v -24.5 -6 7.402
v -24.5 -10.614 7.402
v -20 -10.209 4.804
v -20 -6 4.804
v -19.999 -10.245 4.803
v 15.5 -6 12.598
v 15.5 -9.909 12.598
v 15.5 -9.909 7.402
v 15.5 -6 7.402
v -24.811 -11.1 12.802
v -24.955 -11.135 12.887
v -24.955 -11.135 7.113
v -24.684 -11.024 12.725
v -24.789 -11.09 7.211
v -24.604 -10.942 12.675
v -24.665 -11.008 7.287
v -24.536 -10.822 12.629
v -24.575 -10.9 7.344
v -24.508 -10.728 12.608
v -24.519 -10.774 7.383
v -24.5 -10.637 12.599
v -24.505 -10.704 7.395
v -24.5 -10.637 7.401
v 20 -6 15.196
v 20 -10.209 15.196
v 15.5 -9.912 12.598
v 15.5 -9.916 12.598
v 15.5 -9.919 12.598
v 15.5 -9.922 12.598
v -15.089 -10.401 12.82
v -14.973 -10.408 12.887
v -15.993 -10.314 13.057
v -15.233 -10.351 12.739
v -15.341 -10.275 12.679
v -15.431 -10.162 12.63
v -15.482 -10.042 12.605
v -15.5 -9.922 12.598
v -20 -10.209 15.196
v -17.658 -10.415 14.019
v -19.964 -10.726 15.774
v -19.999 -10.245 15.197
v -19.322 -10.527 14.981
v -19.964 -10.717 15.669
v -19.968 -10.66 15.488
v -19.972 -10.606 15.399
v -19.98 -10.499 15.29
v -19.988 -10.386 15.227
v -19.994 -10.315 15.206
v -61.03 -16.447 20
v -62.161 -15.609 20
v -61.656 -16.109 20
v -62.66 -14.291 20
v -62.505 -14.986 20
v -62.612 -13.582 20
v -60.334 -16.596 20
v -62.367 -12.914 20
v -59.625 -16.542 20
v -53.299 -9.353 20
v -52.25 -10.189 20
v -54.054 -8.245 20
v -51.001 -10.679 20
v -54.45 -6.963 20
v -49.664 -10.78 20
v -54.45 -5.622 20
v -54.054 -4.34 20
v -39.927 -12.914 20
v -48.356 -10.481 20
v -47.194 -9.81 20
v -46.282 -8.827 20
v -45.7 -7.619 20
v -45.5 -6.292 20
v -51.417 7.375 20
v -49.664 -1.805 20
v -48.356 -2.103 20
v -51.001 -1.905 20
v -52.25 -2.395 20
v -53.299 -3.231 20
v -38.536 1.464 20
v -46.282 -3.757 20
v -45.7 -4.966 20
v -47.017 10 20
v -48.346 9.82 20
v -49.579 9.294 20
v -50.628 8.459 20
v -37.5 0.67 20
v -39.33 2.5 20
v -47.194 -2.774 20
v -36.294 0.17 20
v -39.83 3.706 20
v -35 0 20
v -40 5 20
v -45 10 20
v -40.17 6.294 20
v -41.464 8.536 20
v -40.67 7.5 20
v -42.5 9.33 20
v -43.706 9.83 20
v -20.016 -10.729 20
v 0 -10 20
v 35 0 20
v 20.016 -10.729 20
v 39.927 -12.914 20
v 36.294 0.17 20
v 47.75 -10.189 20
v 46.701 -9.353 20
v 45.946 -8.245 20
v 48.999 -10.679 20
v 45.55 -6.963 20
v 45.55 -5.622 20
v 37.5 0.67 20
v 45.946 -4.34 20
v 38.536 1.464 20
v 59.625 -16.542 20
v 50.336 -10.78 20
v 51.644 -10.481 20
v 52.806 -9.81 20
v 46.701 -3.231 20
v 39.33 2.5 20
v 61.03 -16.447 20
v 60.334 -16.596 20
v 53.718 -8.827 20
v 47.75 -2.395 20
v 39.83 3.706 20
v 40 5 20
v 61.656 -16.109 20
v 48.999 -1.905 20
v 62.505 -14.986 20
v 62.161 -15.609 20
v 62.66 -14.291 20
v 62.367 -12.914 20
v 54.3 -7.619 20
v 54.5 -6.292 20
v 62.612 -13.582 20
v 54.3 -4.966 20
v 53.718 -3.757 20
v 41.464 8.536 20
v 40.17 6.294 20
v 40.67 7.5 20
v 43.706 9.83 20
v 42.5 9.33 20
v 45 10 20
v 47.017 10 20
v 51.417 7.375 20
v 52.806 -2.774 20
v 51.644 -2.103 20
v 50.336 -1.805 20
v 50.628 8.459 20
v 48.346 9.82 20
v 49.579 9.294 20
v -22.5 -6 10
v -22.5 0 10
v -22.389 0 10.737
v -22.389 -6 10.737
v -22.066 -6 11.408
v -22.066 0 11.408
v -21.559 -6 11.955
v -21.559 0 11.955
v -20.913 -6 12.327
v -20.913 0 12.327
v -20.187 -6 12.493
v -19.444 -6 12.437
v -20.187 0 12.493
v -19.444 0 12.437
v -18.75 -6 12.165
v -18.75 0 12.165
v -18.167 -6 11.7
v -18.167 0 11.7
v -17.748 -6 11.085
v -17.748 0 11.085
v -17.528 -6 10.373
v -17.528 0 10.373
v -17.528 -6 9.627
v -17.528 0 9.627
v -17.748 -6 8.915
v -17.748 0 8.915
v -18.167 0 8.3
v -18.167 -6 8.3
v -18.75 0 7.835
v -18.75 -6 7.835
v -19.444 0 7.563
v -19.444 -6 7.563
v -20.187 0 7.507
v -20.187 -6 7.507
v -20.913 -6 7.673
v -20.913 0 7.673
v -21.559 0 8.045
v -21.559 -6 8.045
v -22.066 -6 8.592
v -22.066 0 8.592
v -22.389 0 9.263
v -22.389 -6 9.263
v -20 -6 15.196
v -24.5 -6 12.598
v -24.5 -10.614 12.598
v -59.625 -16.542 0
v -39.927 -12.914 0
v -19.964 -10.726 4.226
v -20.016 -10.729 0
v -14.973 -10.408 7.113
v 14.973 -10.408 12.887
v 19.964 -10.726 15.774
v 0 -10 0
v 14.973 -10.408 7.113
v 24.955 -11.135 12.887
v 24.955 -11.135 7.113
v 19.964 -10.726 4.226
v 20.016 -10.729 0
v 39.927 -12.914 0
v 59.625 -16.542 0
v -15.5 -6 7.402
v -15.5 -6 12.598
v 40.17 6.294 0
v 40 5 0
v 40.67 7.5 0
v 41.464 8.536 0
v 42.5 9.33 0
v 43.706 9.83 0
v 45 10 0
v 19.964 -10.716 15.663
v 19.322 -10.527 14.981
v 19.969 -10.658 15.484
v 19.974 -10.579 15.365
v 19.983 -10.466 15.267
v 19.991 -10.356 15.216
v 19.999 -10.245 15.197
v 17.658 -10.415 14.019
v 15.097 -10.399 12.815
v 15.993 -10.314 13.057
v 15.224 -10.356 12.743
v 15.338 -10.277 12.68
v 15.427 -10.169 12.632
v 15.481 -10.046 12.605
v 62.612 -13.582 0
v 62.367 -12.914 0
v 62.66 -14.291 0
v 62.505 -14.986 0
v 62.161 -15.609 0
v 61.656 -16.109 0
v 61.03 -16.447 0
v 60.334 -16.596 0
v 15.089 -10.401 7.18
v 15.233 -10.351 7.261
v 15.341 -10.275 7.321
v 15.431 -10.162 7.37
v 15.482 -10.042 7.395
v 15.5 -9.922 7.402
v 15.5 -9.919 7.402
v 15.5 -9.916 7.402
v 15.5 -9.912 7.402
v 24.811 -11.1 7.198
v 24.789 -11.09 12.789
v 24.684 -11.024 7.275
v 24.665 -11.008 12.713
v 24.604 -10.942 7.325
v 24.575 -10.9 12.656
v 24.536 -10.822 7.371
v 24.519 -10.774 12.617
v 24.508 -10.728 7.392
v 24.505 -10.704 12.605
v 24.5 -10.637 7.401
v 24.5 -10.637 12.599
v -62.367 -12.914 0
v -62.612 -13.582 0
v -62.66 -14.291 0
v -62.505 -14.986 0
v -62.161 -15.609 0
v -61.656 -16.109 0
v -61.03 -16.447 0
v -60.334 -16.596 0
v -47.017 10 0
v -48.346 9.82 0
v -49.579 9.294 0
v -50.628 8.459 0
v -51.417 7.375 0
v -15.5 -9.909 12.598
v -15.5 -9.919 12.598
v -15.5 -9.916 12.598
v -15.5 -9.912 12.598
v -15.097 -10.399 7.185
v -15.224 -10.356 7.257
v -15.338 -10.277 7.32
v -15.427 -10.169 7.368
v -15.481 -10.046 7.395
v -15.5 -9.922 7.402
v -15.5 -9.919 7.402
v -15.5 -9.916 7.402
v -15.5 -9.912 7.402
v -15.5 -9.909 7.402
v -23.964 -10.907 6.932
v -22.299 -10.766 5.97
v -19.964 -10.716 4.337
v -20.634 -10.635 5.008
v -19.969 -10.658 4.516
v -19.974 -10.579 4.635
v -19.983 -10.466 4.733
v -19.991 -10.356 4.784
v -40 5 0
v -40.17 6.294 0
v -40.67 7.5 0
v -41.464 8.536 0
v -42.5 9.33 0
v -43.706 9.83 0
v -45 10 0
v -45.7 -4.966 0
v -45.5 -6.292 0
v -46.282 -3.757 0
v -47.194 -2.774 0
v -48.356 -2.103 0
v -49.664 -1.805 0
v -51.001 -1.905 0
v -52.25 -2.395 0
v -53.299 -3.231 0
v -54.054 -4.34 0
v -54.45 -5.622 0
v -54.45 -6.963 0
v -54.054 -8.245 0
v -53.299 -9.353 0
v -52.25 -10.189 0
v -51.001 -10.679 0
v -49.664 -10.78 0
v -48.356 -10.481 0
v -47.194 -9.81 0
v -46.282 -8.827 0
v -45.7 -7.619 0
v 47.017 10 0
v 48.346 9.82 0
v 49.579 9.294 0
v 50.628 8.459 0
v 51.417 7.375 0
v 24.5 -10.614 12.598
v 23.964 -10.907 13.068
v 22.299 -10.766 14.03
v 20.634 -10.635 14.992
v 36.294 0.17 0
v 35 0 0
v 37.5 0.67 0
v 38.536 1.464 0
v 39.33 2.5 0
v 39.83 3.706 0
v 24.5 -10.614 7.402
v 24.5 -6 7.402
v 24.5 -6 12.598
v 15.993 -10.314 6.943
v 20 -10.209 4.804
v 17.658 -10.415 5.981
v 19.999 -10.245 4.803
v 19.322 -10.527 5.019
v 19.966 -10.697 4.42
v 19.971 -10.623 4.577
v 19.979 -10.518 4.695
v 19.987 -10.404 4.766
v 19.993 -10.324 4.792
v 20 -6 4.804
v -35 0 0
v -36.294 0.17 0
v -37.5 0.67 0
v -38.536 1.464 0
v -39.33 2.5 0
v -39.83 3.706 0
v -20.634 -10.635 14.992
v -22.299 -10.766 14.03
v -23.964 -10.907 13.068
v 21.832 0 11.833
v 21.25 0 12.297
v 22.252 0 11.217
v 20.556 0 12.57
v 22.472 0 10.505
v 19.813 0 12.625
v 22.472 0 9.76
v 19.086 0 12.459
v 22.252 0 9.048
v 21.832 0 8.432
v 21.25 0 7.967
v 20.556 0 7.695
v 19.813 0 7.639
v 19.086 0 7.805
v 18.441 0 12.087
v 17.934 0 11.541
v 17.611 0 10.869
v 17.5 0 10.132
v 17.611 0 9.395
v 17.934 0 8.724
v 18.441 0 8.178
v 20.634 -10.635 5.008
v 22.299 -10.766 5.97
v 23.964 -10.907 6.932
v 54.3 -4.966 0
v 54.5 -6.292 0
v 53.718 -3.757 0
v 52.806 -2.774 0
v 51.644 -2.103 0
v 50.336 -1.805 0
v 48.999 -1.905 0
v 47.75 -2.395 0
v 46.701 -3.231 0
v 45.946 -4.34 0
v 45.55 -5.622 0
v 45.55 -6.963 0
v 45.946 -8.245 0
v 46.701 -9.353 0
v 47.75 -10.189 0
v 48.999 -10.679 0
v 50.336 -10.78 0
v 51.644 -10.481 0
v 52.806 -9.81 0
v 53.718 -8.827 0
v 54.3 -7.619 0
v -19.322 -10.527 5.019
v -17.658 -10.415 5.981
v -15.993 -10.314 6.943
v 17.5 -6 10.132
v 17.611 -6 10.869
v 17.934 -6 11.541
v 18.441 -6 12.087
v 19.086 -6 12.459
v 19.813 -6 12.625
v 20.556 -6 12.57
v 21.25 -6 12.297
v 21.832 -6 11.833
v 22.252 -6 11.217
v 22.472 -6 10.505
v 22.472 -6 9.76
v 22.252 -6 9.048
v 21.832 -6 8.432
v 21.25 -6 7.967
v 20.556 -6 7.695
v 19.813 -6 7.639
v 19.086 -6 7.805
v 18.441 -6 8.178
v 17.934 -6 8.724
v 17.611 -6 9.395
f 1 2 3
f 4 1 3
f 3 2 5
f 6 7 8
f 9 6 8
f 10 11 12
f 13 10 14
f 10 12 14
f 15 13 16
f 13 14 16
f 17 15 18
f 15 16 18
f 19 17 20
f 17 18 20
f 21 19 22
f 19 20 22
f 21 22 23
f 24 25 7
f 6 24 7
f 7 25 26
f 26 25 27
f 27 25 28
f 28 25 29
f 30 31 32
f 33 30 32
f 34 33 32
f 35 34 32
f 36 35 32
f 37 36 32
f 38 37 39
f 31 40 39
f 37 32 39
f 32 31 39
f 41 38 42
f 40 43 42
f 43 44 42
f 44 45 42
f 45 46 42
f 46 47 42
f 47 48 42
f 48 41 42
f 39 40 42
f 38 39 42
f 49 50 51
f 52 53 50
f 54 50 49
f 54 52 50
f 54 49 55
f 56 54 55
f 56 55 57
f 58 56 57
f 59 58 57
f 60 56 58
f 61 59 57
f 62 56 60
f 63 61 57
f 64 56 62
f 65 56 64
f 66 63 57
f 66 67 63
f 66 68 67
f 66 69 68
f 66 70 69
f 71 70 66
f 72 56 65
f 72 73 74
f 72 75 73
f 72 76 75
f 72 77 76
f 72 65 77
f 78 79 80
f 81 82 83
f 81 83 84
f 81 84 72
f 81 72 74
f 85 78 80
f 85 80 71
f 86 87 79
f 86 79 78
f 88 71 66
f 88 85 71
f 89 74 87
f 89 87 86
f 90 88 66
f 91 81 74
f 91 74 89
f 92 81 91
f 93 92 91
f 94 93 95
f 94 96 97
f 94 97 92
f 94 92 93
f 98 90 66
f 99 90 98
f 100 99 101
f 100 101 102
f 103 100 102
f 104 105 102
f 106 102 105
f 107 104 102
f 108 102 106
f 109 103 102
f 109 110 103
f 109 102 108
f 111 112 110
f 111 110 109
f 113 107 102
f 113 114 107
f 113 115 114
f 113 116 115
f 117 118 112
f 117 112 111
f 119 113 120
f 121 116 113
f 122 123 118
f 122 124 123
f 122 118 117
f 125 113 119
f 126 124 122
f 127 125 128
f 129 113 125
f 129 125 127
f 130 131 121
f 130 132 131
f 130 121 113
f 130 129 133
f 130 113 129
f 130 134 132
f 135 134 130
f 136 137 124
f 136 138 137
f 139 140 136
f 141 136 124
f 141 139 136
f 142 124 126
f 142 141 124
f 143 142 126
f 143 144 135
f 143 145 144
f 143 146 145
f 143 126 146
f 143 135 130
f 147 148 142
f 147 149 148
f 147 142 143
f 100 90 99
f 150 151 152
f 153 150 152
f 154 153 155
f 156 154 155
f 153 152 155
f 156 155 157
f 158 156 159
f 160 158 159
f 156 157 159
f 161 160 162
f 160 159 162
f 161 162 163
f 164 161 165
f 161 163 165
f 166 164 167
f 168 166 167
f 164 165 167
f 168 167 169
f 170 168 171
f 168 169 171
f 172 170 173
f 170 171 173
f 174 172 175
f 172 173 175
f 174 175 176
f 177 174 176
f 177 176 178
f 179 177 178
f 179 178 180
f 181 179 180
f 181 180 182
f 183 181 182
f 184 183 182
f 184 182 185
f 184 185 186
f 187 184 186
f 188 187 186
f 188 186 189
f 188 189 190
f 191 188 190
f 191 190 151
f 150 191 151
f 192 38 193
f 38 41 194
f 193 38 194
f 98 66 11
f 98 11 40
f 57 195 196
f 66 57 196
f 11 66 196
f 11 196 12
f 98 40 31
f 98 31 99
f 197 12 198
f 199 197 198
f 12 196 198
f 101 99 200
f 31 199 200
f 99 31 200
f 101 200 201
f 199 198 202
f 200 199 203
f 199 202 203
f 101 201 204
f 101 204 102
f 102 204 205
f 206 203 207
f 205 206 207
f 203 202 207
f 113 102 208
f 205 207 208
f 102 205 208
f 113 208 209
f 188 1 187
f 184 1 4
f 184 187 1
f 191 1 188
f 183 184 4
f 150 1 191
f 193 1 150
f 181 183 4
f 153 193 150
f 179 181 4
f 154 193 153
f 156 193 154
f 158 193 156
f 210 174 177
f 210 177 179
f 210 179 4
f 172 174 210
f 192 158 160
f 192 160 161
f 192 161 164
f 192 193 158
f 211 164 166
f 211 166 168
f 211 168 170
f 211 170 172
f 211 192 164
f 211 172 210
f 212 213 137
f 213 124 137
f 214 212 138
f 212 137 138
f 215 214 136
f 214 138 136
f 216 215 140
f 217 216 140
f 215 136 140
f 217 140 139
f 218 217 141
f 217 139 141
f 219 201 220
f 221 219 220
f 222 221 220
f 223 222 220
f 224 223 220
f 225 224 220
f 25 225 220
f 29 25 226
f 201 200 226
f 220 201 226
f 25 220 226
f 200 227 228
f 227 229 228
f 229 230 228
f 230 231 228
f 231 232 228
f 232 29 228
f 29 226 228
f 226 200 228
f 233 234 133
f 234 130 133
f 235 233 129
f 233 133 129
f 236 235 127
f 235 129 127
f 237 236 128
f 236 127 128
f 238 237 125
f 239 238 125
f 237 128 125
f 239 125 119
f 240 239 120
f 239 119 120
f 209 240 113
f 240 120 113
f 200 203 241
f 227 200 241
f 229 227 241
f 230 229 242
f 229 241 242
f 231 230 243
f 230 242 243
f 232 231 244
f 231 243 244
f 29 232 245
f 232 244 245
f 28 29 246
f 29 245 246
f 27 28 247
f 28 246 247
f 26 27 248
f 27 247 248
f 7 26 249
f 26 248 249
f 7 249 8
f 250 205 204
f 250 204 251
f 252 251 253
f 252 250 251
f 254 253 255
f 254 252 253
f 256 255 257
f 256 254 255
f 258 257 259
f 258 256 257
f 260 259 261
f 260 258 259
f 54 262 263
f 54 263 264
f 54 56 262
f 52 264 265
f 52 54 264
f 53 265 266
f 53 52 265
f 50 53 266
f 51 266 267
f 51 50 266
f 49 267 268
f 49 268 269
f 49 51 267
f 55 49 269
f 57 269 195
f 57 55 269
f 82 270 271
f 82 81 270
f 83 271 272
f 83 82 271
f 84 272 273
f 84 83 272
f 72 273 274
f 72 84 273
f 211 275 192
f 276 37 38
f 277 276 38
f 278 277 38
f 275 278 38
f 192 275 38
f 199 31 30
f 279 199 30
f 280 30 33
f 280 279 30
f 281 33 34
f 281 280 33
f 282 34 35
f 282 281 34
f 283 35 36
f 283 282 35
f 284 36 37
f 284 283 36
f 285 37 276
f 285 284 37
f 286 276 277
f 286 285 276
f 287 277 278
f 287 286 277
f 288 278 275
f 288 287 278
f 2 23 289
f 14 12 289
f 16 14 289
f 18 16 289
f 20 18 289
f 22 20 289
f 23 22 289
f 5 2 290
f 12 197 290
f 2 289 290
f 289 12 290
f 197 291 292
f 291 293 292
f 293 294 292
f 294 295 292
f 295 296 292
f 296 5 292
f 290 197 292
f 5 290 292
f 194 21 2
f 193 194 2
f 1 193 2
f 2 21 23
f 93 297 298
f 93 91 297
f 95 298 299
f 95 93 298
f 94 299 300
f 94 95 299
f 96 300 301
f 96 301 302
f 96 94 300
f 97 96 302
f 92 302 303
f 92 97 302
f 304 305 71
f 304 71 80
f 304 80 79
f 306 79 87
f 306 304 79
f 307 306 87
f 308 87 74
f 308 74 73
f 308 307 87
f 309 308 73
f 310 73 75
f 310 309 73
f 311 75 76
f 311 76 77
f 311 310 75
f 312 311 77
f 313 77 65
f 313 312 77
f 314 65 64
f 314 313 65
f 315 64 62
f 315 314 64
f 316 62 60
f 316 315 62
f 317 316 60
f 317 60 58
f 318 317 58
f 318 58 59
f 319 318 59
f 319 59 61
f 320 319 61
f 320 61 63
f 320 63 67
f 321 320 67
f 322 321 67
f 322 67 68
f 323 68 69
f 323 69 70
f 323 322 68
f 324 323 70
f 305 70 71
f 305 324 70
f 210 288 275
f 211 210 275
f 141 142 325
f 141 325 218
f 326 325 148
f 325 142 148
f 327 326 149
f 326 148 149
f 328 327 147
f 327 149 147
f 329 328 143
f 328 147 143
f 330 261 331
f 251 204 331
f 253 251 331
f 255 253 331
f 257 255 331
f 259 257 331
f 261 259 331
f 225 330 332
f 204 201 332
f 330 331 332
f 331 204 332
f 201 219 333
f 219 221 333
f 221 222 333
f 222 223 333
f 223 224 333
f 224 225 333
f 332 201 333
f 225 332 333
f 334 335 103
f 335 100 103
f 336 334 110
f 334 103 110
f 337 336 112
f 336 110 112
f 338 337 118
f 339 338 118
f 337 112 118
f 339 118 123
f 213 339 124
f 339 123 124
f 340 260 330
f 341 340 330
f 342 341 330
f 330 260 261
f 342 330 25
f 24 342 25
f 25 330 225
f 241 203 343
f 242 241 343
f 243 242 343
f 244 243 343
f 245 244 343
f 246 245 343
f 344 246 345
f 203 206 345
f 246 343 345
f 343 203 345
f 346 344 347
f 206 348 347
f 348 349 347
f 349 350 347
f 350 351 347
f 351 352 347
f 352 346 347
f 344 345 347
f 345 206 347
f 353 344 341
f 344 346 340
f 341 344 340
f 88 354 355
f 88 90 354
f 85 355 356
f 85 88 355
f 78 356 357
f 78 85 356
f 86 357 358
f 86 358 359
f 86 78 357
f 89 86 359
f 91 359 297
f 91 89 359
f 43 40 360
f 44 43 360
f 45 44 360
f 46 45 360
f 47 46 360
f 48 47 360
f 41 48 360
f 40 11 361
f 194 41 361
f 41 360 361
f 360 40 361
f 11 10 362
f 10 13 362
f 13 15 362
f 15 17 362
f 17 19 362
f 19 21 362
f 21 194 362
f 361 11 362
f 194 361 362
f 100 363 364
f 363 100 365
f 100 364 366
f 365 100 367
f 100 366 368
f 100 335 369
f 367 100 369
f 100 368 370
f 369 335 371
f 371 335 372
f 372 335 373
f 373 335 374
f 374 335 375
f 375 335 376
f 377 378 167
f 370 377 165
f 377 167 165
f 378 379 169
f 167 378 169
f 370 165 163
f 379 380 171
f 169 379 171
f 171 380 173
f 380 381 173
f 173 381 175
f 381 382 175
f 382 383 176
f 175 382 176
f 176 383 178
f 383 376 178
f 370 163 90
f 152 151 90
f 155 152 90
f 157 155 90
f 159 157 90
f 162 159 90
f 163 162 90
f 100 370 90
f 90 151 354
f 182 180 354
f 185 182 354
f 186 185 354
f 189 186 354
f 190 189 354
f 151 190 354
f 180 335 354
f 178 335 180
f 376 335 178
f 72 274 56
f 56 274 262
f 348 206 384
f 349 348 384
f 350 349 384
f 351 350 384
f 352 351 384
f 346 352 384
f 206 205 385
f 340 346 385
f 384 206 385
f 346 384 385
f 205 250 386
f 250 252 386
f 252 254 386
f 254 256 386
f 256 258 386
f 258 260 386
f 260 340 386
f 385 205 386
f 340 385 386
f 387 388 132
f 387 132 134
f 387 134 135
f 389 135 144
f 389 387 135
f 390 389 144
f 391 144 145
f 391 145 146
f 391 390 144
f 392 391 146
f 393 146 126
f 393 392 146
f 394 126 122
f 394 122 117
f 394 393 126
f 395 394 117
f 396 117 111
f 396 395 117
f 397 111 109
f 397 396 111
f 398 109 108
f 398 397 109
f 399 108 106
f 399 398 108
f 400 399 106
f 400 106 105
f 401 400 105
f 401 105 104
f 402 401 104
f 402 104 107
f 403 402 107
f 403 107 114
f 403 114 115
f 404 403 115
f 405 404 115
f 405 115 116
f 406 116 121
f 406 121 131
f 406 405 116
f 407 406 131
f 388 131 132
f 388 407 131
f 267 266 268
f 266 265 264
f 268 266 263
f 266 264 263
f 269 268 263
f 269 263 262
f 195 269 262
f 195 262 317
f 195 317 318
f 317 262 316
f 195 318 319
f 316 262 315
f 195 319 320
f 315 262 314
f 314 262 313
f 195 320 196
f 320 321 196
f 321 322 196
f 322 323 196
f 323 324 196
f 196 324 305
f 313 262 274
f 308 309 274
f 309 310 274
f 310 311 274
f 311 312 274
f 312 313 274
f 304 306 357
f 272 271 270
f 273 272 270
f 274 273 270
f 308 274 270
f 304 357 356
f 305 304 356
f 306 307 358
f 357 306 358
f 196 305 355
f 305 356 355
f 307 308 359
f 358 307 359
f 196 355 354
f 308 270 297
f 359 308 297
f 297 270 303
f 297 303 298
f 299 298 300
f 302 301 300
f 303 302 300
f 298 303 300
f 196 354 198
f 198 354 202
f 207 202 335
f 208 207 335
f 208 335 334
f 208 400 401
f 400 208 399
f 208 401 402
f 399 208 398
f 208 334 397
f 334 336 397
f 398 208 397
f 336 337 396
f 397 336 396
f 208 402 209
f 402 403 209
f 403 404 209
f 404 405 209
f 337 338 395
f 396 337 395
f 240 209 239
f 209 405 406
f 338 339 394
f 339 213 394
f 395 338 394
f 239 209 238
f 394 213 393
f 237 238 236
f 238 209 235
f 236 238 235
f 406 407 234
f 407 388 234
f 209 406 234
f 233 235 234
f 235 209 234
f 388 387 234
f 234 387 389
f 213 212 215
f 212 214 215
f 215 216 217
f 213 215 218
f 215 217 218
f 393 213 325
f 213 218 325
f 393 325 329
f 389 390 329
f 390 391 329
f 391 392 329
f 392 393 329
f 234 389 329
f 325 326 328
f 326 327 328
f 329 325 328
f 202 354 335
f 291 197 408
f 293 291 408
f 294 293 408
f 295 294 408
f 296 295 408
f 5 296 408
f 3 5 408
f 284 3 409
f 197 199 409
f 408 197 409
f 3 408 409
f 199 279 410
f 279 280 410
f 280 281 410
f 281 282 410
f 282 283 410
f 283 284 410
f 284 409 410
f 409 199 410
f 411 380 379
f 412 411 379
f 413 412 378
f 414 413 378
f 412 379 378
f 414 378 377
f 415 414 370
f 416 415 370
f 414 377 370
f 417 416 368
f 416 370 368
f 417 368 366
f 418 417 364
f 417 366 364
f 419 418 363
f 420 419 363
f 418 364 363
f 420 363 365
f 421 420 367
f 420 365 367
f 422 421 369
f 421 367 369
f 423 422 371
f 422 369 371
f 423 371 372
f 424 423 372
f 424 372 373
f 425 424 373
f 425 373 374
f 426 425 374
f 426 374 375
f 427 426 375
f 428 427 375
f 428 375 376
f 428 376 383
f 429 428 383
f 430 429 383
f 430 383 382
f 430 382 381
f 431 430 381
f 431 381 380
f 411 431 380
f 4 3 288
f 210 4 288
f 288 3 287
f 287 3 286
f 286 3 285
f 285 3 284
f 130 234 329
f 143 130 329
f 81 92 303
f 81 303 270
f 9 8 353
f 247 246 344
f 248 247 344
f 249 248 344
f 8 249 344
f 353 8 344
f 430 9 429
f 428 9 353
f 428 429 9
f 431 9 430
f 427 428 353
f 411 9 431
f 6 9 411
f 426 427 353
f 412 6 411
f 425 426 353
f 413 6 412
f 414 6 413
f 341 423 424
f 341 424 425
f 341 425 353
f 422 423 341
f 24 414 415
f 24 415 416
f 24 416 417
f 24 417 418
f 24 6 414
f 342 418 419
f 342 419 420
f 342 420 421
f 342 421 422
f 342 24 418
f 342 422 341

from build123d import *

# Parameters (mm, degrees)
F0_R     = 4.5
F1_DEPTH = 20
F2_R     = 4.99999
F3_R     = 2.5
F4_R     = 2.5
F5_DEPTH = 25
F8_DEPTH = 6
F9_R     = 0.5


# Not quite as in the source:
# - a fillet or chamfer is up to 0.001 mm smaller than in the source, because OpenCascade refuses the exact size
# - a feature names something its author has since deleted; it is built from what else it names


with BuildPart() as f1:
    # F0 (on Top) → F1 (new body)
    with BuildSketch(Plane.XY):
        with BuildLine():
            Line((40, 0), (-40, 0))
            Line((-40, 0), (-40, 10))
            Line((-40, 10), (-50, 10))
            Line((-50, 10), (-65, -17.7922156823))
            ThreePointArc((-65, -17.7922156823), (0, -10), (65, -17.7922156823))
            Line((65, -17.7922156823), (50, 10))
            Line((50, 10), (40, 10))
            Line((40, 10), (40, 0))
        make_face()
        with Locations((-50, -6.2922156823)):
            Circle(F0_R, mode=Mode.SUBTRACT)
        with Locations((50, -6.2922156823)):
            Circle(F0_R, mode=Mode.SUBTRACT)
    extrude(amount=F1_DEPTH)

    # F2 (radius 5 in the source; OpenCascade refuses exactly that, so slightly less here)
    f2_edges = [f1.edges().sort_by_distance(p)[0] for p in [
        (-40, 10, 10),
        (-40, 0, 10),
        (40, 10, 10),
        (40, 0, 10),
        (-50, 10, 10),
        (50, 10, 10),
    ]]
    fillet(f2_edges, radius=F2_R)

    # F3
    f3_edges = [f1.edges().sort_by_distance(p)[0] for p in [
        (-65, -17.792216, 10),
        (65, -17.792216, 10),
    ]]
    fillet(f3_edges, radius=F3_R)

    # F4 (on face) → F5 (cut)
    with BuildSketch(Plane(origin=(0, 0, 0), x_dir=(-1, 0, 0), z_dir=(0, 1, 0))):
        with Locations((-19.9995623863, 10.1323040371)):
            Circle(F4_R)
        with Locations((20, 10)):
            Circle(F4_R)
    extrude(amount=-F5_DEPTH, mode=Mode.SUBTRACT)

    # F7 (on offset) → F8 (cut)
    with BuildSketch(Plane.XZ.offset(12)):
        Polygon((-15.5, 7.4019237886), (-15.5, 12.5980762114), (-20, 15.1961524227), (-24.5, 12.5980762114), (-24.5, 7.4019237886), (-20, 4.8038475773), align=None)
        Polygon((15.5, 12.5980762114), (15.5, 7.4019237886), (20, 4.8038475773), (24.5, 7.4019237886), (24.5, 12.5980762114), (20, 15.1961524227), align=None)
    extrude(amount=-F8_DEPTH, mode=Mode.SUBTRACT)

    # F9
    f9_edges = [f1.edges().sort_by_distance(p)[0] for p in [
        (-22.250563, -10.901637, 13.896789),
        (-24.5, -11.093538, 10),
        (-22.250563, -10.901637, 6.103211),
        (-17.750448, -10.573468, 6.102627),
        (-15.5, -10.437166, 10),
        (-17.750448, -10.573468, 13.897373),
        (17.750448, -10.573468, 13.897373),
        (15.5, -10.437166, 10),
        (17.750448, -10.573468, 6.102627),
        (22.250563, -10.901637, 6.103211),
        (24.5, -11.093538, 10),
        (22.250563, -10.901637, 13.896789),
    ]]
    fillet(f9_edges, radius=F9_R)


solid = f1.part
